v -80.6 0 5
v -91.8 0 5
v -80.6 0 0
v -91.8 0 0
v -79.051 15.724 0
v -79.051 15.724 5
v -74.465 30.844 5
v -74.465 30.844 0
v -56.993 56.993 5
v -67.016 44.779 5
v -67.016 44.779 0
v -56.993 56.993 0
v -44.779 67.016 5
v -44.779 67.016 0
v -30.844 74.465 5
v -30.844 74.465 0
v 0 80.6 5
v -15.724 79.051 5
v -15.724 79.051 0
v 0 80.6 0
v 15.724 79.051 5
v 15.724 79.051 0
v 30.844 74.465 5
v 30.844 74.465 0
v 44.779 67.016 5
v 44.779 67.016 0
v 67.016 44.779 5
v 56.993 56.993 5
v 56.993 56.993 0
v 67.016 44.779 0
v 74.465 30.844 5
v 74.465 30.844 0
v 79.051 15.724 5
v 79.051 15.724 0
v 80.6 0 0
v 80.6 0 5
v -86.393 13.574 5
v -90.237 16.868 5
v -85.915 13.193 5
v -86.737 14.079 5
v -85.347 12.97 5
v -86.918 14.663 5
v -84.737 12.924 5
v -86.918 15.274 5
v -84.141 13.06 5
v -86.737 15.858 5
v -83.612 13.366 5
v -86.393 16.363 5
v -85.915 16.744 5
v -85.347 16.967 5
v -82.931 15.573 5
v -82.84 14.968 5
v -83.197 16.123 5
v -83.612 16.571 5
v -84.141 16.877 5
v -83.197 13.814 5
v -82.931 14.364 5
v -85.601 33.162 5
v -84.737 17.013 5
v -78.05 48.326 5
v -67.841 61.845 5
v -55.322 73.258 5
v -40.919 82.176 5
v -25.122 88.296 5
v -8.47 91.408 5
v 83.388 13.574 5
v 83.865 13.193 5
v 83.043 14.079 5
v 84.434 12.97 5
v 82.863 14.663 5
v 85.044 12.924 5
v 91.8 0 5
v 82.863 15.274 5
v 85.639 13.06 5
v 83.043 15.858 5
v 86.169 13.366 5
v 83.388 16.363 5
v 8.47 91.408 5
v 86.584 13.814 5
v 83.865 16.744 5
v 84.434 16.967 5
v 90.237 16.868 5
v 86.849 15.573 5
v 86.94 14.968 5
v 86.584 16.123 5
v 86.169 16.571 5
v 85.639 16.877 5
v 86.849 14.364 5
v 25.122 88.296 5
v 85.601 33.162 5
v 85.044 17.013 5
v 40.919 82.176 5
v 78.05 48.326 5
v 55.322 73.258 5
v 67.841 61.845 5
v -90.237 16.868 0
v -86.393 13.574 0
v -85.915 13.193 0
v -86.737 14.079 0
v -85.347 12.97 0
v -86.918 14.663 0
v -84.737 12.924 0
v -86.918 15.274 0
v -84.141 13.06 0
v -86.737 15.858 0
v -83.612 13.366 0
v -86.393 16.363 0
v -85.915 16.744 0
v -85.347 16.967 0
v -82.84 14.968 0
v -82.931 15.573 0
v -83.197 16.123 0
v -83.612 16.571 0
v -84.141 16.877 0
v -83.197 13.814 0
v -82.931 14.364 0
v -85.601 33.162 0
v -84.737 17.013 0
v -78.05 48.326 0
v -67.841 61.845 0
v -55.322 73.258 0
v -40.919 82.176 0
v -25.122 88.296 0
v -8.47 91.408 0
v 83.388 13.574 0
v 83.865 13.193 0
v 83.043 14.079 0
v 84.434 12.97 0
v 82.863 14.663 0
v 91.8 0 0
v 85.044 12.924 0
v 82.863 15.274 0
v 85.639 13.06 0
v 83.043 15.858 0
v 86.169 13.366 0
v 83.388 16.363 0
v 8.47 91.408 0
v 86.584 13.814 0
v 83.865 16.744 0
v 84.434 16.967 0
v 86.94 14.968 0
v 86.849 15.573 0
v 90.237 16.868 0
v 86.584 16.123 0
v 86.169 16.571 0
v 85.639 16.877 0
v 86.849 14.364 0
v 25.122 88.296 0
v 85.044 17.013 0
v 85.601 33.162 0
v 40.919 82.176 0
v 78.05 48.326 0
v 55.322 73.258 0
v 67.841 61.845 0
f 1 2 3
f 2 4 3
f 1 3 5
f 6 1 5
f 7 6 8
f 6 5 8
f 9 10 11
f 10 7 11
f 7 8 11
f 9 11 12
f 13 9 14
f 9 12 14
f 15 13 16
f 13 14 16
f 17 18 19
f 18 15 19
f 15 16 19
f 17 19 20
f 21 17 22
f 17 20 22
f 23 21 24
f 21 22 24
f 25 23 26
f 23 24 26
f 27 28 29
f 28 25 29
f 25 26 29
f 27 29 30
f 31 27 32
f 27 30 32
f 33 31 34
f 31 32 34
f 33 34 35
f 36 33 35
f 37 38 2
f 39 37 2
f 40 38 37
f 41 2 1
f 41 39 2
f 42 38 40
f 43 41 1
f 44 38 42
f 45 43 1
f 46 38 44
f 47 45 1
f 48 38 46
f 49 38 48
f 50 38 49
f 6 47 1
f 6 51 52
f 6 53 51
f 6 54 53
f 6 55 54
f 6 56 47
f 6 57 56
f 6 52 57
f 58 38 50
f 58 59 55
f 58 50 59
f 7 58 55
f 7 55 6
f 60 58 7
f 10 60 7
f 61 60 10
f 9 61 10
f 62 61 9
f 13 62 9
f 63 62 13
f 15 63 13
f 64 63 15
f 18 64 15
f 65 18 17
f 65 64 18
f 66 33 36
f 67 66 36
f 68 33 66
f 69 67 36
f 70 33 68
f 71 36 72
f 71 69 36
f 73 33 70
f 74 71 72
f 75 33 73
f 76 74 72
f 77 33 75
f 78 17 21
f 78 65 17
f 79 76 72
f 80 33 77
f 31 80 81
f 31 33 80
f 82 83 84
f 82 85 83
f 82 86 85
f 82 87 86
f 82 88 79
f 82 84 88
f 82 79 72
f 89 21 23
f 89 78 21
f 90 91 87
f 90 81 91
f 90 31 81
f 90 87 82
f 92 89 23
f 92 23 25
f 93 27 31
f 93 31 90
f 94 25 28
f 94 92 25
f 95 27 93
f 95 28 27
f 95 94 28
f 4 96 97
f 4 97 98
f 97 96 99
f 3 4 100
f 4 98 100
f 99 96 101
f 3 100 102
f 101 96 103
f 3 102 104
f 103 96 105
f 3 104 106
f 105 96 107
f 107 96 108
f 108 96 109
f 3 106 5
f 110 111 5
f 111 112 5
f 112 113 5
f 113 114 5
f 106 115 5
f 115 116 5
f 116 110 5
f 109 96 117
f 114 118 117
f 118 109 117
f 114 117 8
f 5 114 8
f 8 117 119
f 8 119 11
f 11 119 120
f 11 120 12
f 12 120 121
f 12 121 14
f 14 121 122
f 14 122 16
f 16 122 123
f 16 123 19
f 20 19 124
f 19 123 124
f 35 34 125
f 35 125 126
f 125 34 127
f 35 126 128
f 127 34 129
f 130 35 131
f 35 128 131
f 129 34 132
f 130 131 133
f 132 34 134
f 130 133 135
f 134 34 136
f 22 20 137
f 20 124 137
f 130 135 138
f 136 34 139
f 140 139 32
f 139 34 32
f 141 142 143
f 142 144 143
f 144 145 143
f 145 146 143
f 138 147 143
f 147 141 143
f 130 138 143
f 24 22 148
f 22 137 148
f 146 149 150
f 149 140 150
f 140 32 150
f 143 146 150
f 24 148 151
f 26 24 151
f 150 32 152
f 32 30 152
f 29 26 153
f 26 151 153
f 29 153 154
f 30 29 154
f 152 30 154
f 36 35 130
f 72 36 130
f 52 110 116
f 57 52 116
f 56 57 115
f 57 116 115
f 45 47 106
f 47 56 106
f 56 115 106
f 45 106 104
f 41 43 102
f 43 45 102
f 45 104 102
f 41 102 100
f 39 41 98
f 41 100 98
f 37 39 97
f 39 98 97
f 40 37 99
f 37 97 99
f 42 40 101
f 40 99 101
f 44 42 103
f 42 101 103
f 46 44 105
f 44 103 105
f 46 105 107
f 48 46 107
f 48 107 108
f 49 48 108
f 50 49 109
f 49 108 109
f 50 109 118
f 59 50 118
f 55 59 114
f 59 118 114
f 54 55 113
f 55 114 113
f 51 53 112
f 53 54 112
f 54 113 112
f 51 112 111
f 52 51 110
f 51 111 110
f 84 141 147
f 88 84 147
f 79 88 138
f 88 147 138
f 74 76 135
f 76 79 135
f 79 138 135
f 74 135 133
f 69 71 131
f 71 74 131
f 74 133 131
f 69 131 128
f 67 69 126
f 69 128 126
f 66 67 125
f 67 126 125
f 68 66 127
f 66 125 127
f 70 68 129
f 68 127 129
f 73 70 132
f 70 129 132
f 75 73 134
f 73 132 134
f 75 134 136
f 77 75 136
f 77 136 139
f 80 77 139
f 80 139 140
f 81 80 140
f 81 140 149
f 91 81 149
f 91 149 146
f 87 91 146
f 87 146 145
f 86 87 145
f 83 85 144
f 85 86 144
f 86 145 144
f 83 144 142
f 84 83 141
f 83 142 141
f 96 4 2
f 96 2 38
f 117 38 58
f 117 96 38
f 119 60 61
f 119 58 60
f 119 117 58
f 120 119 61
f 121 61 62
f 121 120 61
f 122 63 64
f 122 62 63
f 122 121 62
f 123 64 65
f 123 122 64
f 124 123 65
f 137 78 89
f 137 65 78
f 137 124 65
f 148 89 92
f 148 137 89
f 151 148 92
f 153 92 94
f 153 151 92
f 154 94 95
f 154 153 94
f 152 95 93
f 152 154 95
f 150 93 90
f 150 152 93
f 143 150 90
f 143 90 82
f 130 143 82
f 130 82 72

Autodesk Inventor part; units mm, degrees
ref_plane "YZ Plane" through (0, 0, 0) normal (1, 0, 0) x (0, 1, 0)
ref_plane "XZ Plane" through (0, 0, 0) normal (0, 1, 0) x (-1, 0, 0)
ref_plane "XY Plane" through (0, 0, 0) normal (0, 0, 1) x (1, 0, 0)
sketch "Skizze1" plane through (0, 0, 0) normal (0, 0, 1) x (1, 0, 0)
  circle A0 centre (0, 0) radius 80.1 construction
  circle A1 centre (0, 0) radius 93.8 construction
  circle A2 centre (0, 0) radius 80.6
  circle A3 centre (0, 0) radius 91.8
  line L0 (-91.8, 0) -> (-80.6, 0)
  line L1 (80.6, 0) -> (91.8, 0)
  circle A4 centre (0, 0) radius 86.2 construction
  circle A5 centre (-84.8904, 14.9685) radius 2.05
  circle A6 centre (84.8904, 14.9685) radius 2.05
  line L2 (0, 0) -> (-84.8904, 14.9685) construction
  line L3 (0, 0) -> (84.8904, 14.9685) construction
  point P0 (0, 86.1)
  point P1 (5.5, 80.4121)
  point P2 (-5.5, 80.4121)
  dimension "d0" = 160.2
  dimension "d1" = 187.6
  dimension "d2" = 0.5
  dimension "d3" = 2
  dimension "d8" = 5.6
  dimension "d9" = 4.1
  dimension "d10" = 10
  dimension "d11" = 10
extrude "Extrusion1" add sketch "Skizze1" along normal blind 5 contours A2 L0 A3 L1 picked at (4.3548, 87.7552)
properties part number "Montage_Ring_Hinten_Teil1"
